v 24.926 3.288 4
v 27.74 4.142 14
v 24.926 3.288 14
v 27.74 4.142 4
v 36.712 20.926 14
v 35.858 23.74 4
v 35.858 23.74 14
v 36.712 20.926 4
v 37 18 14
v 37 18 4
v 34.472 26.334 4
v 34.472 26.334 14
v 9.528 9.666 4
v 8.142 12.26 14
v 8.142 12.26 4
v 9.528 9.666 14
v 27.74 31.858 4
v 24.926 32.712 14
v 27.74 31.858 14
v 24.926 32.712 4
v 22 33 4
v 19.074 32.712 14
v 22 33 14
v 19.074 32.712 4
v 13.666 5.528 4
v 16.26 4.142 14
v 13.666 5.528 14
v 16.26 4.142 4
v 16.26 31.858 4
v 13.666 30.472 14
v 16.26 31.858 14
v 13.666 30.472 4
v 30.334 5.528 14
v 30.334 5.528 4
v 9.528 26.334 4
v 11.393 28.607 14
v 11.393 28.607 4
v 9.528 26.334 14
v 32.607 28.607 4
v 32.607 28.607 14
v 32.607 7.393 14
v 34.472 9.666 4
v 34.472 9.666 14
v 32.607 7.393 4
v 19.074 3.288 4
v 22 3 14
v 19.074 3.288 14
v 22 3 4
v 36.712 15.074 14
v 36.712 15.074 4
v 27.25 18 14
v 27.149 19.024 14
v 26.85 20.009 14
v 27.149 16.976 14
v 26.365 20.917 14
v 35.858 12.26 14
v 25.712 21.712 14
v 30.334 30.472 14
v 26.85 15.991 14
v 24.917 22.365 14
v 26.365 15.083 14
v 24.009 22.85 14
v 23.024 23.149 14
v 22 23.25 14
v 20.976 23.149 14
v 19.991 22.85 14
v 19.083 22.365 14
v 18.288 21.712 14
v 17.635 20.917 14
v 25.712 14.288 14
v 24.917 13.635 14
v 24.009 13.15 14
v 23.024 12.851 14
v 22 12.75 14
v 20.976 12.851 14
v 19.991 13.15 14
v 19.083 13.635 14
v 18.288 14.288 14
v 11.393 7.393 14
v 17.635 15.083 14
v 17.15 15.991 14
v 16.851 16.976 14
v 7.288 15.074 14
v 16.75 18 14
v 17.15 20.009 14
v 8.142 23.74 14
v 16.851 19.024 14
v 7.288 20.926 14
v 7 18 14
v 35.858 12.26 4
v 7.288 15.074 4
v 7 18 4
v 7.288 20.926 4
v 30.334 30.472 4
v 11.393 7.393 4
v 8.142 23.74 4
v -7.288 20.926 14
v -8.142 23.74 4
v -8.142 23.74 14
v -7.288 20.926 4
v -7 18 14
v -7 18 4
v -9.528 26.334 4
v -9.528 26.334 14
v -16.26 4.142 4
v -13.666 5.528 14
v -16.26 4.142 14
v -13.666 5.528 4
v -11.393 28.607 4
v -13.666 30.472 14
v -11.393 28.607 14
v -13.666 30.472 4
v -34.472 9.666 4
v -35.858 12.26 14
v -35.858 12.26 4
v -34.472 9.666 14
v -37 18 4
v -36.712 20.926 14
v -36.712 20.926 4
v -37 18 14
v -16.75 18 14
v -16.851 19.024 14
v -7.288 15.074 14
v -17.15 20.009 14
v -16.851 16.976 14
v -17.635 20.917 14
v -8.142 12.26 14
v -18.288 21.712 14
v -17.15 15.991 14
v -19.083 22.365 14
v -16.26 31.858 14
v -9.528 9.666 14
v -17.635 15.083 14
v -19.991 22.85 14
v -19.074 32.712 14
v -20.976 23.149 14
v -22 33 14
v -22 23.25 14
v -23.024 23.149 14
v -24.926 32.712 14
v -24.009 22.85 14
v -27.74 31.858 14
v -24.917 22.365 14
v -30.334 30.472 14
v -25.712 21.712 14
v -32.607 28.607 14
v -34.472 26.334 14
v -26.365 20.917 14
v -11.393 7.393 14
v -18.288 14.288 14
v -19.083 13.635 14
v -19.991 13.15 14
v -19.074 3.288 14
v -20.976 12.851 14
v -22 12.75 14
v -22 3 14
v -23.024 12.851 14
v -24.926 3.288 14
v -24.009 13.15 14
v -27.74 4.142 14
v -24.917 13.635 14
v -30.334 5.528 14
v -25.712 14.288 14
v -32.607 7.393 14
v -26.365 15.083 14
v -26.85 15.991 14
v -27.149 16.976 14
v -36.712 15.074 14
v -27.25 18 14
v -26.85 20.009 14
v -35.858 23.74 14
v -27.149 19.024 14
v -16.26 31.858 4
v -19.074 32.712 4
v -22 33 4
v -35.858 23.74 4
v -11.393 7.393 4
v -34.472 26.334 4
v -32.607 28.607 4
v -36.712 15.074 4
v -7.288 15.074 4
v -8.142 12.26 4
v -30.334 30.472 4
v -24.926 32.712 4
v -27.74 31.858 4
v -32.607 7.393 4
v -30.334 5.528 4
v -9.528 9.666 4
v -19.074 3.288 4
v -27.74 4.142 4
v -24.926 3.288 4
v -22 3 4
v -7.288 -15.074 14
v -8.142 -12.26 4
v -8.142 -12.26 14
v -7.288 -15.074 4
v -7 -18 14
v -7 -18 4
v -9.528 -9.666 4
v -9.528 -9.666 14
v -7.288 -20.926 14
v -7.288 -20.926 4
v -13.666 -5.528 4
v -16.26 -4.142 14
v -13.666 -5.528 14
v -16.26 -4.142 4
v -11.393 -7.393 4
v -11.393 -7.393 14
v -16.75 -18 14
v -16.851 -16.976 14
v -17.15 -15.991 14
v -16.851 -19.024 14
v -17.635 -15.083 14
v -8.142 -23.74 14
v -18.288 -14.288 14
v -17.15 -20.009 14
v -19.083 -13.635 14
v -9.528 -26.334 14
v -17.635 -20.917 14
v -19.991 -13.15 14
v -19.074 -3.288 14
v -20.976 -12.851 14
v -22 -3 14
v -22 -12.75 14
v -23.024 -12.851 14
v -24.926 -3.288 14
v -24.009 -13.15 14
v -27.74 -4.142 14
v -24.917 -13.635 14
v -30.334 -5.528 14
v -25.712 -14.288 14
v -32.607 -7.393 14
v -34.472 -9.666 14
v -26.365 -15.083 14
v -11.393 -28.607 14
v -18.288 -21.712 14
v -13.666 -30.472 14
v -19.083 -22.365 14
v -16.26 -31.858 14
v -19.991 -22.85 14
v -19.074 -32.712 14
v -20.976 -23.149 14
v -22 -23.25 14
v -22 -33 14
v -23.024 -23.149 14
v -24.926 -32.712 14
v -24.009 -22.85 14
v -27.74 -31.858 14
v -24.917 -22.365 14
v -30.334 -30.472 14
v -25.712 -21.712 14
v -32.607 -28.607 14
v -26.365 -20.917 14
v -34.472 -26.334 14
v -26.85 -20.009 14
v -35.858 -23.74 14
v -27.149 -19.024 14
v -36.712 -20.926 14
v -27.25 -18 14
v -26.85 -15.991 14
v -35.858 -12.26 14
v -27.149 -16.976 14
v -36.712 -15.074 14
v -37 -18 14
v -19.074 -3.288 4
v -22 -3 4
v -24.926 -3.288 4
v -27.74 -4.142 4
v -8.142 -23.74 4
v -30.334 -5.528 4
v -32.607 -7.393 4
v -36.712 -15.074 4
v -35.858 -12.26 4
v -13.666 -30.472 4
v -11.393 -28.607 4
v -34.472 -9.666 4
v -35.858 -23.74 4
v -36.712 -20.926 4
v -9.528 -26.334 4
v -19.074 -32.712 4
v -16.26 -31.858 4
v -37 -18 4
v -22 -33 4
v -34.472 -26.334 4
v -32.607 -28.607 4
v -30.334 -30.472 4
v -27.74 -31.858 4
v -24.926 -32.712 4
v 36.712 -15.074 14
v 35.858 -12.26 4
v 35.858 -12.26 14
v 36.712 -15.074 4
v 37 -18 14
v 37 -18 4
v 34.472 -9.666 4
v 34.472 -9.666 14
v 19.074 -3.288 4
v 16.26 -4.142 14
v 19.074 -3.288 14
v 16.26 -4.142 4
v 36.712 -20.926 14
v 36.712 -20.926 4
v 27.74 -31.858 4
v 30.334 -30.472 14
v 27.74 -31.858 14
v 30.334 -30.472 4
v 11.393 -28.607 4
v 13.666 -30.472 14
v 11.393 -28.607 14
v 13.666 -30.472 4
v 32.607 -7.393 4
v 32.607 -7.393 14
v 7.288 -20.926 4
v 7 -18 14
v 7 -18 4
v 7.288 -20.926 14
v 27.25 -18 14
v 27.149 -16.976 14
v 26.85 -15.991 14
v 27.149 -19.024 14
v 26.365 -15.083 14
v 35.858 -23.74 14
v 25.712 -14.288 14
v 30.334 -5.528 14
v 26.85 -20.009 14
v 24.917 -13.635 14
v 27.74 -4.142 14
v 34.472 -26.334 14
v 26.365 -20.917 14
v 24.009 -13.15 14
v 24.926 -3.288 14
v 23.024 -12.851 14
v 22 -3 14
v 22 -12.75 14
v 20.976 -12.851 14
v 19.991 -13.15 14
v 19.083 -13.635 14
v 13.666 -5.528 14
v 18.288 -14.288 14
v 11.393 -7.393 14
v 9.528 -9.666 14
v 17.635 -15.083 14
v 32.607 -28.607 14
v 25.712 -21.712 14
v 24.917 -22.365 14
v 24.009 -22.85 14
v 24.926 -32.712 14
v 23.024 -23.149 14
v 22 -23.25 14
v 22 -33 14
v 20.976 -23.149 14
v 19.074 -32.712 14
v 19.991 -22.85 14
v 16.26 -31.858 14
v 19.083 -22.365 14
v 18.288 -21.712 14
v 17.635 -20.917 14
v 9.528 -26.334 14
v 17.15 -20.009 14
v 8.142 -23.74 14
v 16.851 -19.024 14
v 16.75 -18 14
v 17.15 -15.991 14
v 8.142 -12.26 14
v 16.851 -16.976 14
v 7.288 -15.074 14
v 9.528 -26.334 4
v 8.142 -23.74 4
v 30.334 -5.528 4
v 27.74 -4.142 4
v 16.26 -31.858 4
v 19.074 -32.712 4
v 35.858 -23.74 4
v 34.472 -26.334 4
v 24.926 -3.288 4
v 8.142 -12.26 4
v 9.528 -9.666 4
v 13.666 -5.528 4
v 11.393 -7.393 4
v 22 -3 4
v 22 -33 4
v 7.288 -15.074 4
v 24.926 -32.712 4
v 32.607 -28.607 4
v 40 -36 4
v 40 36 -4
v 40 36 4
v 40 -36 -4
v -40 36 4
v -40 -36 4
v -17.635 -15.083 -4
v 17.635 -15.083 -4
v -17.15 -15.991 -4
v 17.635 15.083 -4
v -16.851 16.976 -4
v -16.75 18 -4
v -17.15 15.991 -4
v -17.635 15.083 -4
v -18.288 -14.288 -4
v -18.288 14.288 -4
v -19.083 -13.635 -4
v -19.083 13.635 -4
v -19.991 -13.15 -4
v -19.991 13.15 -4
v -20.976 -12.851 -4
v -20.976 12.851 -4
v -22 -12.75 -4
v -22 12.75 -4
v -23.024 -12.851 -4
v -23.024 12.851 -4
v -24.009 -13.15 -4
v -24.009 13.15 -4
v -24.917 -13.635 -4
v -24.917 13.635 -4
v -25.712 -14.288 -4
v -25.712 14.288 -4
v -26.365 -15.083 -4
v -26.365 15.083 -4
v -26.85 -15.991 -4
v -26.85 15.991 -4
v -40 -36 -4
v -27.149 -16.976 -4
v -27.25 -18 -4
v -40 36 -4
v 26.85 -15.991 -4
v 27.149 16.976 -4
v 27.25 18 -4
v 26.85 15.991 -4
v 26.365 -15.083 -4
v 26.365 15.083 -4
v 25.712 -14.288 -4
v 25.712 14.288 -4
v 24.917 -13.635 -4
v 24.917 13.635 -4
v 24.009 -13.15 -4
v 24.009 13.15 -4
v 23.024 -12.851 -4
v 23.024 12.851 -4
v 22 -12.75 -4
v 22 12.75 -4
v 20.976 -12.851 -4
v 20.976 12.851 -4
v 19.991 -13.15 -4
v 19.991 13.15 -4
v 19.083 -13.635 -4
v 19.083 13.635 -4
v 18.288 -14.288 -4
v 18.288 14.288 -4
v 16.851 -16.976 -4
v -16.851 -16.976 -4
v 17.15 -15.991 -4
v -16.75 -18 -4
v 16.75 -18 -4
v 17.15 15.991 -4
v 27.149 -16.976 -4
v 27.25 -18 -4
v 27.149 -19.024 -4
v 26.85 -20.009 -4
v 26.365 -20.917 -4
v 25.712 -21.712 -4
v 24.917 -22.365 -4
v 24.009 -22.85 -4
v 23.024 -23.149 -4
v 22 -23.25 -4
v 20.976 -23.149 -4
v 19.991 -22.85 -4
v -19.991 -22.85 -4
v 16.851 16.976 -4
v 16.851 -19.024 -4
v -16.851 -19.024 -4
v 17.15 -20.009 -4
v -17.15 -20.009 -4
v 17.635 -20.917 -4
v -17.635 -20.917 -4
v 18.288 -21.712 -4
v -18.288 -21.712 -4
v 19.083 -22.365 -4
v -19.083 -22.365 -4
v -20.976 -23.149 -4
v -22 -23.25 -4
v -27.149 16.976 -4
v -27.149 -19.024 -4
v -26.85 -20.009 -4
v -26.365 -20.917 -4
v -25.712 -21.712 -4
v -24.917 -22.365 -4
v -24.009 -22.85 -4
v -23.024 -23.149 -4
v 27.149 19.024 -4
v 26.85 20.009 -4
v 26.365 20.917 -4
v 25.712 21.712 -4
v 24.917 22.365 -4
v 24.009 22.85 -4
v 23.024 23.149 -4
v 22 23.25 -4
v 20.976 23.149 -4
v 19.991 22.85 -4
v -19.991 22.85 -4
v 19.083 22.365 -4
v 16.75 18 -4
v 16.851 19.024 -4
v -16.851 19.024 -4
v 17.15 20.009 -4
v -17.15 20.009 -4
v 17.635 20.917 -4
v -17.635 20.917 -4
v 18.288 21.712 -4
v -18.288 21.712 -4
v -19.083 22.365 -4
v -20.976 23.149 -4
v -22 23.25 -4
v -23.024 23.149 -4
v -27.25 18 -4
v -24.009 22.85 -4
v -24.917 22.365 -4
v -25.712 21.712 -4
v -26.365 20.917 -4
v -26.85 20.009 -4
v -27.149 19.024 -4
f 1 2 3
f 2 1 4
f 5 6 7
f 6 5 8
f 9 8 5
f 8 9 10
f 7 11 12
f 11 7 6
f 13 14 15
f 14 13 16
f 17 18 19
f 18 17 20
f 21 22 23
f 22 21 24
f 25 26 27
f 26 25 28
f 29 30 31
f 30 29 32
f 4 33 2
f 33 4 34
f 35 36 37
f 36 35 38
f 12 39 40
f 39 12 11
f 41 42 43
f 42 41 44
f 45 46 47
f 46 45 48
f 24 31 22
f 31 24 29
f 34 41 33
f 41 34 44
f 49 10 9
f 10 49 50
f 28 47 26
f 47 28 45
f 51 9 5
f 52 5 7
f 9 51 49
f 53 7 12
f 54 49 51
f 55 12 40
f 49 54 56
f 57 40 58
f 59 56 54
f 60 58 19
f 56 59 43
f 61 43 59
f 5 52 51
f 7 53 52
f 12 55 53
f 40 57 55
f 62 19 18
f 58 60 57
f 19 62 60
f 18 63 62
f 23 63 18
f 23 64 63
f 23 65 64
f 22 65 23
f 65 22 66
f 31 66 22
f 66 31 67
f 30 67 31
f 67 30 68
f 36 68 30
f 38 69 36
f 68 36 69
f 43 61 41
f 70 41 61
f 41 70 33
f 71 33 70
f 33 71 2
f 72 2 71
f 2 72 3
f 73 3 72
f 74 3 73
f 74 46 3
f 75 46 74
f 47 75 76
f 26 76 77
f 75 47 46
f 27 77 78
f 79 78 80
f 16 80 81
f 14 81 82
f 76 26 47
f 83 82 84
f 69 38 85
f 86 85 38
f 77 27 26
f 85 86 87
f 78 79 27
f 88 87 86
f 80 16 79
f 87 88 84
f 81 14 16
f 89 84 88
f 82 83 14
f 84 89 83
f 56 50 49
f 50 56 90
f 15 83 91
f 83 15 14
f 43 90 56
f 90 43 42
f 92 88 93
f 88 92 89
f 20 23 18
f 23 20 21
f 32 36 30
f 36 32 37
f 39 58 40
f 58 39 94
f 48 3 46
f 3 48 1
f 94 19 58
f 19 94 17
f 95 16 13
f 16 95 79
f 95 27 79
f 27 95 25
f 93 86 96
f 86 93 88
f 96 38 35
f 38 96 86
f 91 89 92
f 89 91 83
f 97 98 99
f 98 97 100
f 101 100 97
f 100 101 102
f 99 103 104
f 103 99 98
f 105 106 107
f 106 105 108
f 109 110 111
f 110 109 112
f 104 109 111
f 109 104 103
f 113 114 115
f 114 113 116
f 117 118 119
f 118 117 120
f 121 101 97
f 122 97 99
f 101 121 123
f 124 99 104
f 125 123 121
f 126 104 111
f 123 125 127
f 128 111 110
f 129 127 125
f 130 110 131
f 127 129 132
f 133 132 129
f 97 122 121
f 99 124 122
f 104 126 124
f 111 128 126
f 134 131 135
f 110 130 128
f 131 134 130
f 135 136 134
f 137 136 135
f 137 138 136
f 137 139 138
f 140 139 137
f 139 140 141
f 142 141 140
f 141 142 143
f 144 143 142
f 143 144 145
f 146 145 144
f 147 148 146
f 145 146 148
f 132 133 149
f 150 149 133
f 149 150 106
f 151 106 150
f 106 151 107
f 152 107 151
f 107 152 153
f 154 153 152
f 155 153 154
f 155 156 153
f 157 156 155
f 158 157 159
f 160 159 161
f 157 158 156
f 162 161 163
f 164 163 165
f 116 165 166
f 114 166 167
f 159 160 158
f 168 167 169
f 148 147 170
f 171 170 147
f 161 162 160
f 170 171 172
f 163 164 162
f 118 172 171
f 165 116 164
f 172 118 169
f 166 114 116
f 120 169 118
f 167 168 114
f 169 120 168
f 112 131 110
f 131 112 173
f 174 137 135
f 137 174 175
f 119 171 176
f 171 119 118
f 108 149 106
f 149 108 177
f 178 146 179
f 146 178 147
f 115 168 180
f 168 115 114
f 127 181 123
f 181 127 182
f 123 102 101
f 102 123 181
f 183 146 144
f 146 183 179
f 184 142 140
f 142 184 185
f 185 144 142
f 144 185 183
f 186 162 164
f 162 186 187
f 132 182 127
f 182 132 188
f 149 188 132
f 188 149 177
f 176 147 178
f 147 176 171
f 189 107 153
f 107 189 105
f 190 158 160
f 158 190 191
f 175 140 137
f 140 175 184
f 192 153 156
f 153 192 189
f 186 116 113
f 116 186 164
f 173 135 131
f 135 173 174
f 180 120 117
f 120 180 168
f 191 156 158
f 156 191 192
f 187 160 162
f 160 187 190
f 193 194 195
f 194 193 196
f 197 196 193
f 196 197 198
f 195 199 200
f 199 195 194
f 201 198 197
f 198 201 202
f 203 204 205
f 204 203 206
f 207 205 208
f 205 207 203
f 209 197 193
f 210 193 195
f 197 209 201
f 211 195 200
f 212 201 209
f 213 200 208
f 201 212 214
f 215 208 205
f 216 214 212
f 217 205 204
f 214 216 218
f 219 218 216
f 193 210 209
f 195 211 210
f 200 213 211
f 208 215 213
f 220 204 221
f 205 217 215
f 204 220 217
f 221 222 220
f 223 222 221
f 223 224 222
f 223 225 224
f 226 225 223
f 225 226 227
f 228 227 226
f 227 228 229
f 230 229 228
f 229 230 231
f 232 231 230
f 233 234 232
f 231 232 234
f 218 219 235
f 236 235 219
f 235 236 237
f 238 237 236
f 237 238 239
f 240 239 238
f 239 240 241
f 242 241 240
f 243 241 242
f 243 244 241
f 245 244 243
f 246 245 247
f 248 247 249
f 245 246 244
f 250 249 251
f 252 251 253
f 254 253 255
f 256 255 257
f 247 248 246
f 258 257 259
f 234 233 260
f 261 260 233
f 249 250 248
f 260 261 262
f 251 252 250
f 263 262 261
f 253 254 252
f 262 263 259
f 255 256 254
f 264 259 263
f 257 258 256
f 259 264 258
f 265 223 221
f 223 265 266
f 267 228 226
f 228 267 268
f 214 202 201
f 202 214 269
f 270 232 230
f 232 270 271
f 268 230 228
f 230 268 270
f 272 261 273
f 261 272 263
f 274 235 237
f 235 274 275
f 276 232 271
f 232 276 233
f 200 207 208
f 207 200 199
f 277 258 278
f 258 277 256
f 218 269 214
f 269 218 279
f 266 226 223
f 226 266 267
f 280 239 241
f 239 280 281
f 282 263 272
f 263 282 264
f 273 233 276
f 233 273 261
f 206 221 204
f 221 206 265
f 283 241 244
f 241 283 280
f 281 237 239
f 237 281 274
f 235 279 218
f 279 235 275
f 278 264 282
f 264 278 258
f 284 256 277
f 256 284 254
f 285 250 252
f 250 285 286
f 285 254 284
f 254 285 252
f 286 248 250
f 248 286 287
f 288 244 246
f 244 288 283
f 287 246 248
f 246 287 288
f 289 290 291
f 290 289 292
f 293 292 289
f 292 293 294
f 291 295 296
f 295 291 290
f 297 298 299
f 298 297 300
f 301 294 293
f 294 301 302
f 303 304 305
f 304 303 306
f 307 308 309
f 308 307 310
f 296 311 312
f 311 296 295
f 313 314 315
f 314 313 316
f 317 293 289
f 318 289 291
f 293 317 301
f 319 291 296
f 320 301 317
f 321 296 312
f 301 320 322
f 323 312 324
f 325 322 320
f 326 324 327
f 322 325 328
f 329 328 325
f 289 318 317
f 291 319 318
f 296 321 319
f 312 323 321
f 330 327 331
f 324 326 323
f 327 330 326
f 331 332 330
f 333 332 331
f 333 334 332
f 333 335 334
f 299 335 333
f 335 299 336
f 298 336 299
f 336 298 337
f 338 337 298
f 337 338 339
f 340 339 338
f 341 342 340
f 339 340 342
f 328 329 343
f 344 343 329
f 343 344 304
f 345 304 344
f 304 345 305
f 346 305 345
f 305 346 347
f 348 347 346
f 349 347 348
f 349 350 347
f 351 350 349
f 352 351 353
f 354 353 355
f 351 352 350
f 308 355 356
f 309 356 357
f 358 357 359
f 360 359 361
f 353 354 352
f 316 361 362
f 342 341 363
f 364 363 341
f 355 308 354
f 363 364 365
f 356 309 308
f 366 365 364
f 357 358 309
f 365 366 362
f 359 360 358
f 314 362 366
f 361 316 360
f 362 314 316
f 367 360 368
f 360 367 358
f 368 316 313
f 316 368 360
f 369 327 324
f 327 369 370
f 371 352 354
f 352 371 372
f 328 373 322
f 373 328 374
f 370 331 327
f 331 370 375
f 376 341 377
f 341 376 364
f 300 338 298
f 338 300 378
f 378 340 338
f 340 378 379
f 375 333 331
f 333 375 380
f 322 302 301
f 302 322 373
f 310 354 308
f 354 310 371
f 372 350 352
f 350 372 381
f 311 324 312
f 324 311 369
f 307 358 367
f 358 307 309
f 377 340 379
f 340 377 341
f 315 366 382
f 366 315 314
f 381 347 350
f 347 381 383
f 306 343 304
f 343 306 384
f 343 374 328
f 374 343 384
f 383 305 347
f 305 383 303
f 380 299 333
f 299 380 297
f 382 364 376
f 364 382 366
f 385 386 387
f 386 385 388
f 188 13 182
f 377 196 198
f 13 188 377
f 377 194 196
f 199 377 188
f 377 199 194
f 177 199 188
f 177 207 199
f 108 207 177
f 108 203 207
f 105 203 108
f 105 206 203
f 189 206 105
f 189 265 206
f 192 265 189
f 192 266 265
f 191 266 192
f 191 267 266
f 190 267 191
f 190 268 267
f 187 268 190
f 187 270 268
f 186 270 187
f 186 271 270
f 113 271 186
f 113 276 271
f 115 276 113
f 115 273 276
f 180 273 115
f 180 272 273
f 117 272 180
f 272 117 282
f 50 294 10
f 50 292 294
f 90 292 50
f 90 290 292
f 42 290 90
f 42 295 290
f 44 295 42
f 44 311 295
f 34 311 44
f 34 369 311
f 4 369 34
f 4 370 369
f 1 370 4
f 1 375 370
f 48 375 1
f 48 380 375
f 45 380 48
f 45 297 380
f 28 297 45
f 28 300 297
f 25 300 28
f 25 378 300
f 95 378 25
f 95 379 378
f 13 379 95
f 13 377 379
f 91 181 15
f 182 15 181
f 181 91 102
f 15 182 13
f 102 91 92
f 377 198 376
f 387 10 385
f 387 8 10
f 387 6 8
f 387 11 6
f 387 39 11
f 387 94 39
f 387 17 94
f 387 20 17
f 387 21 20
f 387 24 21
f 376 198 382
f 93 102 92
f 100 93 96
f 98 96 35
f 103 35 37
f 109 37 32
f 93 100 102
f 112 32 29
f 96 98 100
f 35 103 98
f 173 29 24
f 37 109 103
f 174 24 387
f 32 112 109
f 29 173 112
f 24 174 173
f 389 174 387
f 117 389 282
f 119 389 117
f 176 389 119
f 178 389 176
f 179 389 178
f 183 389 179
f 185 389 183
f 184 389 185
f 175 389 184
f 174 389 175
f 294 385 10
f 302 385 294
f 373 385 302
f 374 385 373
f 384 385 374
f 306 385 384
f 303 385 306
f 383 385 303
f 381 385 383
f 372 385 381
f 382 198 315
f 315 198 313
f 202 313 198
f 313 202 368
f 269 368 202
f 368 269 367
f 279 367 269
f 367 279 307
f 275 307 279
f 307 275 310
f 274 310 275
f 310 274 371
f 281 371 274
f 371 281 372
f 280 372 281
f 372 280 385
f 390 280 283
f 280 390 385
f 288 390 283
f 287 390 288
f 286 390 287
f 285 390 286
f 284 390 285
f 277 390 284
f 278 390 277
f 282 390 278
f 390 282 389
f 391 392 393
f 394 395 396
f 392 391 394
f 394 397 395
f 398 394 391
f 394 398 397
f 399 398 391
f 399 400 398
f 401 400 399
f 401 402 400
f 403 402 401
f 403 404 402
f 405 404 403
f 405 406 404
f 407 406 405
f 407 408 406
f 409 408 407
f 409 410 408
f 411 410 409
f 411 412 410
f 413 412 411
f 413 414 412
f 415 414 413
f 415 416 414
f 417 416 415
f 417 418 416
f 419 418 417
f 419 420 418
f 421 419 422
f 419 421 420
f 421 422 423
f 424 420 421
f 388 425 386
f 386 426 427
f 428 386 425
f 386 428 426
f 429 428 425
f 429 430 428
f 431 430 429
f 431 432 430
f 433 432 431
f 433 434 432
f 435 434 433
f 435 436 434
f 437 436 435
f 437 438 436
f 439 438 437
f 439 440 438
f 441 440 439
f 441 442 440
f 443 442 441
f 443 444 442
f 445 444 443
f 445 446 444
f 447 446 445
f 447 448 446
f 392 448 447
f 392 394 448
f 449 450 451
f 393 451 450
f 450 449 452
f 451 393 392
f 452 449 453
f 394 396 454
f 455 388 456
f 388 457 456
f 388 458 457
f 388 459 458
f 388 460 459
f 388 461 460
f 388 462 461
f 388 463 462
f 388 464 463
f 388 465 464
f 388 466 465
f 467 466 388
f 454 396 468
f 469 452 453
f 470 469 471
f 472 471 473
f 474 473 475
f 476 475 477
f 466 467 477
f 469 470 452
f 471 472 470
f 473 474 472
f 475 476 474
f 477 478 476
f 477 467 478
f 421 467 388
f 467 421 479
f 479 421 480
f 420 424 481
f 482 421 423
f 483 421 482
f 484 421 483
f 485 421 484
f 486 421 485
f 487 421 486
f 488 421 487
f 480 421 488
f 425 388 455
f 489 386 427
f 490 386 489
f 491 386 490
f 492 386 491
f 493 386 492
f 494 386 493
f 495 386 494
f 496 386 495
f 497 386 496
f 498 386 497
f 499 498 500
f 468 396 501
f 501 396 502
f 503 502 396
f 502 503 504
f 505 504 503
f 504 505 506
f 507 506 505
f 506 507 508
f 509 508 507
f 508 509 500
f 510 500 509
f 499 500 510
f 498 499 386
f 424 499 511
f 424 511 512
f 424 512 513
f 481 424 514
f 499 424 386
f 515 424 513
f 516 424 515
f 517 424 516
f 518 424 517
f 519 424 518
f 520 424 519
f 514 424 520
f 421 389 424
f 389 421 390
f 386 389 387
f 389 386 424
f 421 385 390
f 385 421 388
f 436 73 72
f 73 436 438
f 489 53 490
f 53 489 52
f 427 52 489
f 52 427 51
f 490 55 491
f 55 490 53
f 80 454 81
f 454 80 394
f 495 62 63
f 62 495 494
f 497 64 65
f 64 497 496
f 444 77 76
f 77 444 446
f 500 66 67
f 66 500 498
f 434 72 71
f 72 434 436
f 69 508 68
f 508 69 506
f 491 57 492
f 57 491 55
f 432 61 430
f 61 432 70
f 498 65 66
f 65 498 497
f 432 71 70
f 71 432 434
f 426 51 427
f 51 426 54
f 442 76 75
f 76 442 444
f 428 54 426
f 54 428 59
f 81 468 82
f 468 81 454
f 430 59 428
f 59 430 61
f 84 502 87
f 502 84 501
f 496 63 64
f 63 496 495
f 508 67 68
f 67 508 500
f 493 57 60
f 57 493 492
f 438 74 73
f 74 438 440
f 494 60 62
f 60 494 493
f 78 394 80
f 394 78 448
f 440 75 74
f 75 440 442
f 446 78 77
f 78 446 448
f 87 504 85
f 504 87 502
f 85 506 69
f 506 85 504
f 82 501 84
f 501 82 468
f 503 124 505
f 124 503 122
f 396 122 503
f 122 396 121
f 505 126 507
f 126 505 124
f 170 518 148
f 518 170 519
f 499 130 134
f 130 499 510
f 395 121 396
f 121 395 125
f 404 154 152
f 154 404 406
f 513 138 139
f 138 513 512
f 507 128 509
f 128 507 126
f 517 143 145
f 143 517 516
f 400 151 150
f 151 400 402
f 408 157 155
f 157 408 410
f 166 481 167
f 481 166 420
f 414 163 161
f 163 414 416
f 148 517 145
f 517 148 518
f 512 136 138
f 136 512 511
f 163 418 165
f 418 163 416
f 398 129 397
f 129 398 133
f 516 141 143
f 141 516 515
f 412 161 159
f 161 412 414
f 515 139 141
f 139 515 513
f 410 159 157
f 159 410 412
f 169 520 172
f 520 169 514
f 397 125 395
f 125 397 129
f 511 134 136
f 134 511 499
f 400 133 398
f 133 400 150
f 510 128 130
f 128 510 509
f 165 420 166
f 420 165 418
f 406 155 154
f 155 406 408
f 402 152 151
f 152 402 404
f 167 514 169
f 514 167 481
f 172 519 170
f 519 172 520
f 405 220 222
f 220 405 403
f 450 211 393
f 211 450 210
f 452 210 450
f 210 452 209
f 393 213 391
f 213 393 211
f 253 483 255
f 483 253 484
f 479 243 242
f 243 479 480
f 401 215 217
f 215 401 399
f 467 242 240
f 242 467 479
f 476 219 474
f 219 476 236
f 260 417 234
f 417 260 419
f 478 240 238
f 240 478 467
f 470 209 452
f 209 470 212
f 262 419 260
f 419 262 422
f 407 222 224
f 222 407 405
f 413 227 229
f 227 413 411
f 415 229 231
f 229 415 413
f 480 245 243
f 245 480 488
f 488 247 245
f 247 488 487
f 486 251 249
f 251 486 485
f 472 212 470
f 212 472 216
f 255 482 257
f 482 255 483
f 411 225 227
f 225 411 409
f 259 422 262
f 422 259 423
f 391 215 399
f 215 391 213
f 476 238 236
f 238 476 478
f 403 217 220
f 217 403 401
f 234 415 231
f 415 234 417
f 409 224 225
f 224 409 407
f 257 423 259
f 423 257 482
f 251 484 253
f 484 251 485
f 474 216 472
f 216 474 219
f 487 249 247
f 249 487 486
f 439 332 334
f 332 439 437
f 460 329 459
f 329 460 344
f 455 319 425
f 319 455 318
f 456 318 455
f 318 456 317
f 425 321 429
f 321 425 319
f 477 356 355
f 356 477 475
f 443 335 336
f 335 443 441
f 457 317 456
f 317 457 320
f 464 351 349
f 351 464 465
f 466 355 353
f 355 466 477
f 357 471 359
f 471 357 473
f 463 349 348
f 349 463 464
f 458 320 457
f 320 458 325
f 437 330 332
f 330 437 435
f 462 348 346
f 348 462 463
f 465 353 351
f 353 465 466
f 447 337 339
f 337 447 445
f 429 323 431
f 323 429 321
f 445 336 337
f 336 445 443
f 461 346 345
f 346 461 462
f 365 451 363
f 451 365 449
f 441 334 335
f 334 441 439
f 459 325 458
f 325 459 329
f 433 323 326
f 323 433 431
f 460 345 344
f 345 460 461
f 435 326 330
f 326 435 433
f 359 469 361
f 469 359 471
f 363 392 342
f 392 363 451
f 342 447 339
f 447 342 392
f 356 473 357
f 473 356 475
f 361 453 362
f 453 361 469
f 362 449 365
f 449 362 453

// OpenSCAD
$fn = 32;

// ----------------------------------------------------------------------
// Anchor pads 80 x 72 x 18
// four corner bosses with anchor holes
// ----------------------------------------------------------------------

// --- parameters (mm) ---
plate = [80, 72, 8];  // base plate size (x, y, z)
pads = 4;             // boss count, one per corner
edge = 18;            // boss centre offset from the plate edge
boss_d = 30;          // boss diameter
boss_h = 10;          // boss height above the base plate
hole_d = 10.5;        // hole diameter

// --- derived feature positions (mm) ---
height = plate[2] + boss_h;      // = 18   overall height of the part
corner_x = plate[0] / 2 - edge;  // = 22   boss centre X
corner_y = plate[1] / 2 - edge;  // = 18   boss centre Y
feature_centers = [
  [corner_x, corner_y],
  [-corner_x, corner_y],
  [-corner_x, -corner_y],
  [corner_x, -corner_y]
];   // boss centres, anchor holes are drilled there

// base plate, four bosses standing on it, anchor holes all the way through
difference() {
  union() {
    cube(plate, center = true);
    for (centre = feature_centers)
      translate([centre[0], centre[1], plate[2] / 2 - 1])
        cylinder(d = boss_d, h = boss_h + 1);
  }
  for (centre = feature_centers)
    translate([centre[0], centre[1], -height])
      cylinder(d = hole_d, h = 2 * height + 2);  // through boss and plate
}
